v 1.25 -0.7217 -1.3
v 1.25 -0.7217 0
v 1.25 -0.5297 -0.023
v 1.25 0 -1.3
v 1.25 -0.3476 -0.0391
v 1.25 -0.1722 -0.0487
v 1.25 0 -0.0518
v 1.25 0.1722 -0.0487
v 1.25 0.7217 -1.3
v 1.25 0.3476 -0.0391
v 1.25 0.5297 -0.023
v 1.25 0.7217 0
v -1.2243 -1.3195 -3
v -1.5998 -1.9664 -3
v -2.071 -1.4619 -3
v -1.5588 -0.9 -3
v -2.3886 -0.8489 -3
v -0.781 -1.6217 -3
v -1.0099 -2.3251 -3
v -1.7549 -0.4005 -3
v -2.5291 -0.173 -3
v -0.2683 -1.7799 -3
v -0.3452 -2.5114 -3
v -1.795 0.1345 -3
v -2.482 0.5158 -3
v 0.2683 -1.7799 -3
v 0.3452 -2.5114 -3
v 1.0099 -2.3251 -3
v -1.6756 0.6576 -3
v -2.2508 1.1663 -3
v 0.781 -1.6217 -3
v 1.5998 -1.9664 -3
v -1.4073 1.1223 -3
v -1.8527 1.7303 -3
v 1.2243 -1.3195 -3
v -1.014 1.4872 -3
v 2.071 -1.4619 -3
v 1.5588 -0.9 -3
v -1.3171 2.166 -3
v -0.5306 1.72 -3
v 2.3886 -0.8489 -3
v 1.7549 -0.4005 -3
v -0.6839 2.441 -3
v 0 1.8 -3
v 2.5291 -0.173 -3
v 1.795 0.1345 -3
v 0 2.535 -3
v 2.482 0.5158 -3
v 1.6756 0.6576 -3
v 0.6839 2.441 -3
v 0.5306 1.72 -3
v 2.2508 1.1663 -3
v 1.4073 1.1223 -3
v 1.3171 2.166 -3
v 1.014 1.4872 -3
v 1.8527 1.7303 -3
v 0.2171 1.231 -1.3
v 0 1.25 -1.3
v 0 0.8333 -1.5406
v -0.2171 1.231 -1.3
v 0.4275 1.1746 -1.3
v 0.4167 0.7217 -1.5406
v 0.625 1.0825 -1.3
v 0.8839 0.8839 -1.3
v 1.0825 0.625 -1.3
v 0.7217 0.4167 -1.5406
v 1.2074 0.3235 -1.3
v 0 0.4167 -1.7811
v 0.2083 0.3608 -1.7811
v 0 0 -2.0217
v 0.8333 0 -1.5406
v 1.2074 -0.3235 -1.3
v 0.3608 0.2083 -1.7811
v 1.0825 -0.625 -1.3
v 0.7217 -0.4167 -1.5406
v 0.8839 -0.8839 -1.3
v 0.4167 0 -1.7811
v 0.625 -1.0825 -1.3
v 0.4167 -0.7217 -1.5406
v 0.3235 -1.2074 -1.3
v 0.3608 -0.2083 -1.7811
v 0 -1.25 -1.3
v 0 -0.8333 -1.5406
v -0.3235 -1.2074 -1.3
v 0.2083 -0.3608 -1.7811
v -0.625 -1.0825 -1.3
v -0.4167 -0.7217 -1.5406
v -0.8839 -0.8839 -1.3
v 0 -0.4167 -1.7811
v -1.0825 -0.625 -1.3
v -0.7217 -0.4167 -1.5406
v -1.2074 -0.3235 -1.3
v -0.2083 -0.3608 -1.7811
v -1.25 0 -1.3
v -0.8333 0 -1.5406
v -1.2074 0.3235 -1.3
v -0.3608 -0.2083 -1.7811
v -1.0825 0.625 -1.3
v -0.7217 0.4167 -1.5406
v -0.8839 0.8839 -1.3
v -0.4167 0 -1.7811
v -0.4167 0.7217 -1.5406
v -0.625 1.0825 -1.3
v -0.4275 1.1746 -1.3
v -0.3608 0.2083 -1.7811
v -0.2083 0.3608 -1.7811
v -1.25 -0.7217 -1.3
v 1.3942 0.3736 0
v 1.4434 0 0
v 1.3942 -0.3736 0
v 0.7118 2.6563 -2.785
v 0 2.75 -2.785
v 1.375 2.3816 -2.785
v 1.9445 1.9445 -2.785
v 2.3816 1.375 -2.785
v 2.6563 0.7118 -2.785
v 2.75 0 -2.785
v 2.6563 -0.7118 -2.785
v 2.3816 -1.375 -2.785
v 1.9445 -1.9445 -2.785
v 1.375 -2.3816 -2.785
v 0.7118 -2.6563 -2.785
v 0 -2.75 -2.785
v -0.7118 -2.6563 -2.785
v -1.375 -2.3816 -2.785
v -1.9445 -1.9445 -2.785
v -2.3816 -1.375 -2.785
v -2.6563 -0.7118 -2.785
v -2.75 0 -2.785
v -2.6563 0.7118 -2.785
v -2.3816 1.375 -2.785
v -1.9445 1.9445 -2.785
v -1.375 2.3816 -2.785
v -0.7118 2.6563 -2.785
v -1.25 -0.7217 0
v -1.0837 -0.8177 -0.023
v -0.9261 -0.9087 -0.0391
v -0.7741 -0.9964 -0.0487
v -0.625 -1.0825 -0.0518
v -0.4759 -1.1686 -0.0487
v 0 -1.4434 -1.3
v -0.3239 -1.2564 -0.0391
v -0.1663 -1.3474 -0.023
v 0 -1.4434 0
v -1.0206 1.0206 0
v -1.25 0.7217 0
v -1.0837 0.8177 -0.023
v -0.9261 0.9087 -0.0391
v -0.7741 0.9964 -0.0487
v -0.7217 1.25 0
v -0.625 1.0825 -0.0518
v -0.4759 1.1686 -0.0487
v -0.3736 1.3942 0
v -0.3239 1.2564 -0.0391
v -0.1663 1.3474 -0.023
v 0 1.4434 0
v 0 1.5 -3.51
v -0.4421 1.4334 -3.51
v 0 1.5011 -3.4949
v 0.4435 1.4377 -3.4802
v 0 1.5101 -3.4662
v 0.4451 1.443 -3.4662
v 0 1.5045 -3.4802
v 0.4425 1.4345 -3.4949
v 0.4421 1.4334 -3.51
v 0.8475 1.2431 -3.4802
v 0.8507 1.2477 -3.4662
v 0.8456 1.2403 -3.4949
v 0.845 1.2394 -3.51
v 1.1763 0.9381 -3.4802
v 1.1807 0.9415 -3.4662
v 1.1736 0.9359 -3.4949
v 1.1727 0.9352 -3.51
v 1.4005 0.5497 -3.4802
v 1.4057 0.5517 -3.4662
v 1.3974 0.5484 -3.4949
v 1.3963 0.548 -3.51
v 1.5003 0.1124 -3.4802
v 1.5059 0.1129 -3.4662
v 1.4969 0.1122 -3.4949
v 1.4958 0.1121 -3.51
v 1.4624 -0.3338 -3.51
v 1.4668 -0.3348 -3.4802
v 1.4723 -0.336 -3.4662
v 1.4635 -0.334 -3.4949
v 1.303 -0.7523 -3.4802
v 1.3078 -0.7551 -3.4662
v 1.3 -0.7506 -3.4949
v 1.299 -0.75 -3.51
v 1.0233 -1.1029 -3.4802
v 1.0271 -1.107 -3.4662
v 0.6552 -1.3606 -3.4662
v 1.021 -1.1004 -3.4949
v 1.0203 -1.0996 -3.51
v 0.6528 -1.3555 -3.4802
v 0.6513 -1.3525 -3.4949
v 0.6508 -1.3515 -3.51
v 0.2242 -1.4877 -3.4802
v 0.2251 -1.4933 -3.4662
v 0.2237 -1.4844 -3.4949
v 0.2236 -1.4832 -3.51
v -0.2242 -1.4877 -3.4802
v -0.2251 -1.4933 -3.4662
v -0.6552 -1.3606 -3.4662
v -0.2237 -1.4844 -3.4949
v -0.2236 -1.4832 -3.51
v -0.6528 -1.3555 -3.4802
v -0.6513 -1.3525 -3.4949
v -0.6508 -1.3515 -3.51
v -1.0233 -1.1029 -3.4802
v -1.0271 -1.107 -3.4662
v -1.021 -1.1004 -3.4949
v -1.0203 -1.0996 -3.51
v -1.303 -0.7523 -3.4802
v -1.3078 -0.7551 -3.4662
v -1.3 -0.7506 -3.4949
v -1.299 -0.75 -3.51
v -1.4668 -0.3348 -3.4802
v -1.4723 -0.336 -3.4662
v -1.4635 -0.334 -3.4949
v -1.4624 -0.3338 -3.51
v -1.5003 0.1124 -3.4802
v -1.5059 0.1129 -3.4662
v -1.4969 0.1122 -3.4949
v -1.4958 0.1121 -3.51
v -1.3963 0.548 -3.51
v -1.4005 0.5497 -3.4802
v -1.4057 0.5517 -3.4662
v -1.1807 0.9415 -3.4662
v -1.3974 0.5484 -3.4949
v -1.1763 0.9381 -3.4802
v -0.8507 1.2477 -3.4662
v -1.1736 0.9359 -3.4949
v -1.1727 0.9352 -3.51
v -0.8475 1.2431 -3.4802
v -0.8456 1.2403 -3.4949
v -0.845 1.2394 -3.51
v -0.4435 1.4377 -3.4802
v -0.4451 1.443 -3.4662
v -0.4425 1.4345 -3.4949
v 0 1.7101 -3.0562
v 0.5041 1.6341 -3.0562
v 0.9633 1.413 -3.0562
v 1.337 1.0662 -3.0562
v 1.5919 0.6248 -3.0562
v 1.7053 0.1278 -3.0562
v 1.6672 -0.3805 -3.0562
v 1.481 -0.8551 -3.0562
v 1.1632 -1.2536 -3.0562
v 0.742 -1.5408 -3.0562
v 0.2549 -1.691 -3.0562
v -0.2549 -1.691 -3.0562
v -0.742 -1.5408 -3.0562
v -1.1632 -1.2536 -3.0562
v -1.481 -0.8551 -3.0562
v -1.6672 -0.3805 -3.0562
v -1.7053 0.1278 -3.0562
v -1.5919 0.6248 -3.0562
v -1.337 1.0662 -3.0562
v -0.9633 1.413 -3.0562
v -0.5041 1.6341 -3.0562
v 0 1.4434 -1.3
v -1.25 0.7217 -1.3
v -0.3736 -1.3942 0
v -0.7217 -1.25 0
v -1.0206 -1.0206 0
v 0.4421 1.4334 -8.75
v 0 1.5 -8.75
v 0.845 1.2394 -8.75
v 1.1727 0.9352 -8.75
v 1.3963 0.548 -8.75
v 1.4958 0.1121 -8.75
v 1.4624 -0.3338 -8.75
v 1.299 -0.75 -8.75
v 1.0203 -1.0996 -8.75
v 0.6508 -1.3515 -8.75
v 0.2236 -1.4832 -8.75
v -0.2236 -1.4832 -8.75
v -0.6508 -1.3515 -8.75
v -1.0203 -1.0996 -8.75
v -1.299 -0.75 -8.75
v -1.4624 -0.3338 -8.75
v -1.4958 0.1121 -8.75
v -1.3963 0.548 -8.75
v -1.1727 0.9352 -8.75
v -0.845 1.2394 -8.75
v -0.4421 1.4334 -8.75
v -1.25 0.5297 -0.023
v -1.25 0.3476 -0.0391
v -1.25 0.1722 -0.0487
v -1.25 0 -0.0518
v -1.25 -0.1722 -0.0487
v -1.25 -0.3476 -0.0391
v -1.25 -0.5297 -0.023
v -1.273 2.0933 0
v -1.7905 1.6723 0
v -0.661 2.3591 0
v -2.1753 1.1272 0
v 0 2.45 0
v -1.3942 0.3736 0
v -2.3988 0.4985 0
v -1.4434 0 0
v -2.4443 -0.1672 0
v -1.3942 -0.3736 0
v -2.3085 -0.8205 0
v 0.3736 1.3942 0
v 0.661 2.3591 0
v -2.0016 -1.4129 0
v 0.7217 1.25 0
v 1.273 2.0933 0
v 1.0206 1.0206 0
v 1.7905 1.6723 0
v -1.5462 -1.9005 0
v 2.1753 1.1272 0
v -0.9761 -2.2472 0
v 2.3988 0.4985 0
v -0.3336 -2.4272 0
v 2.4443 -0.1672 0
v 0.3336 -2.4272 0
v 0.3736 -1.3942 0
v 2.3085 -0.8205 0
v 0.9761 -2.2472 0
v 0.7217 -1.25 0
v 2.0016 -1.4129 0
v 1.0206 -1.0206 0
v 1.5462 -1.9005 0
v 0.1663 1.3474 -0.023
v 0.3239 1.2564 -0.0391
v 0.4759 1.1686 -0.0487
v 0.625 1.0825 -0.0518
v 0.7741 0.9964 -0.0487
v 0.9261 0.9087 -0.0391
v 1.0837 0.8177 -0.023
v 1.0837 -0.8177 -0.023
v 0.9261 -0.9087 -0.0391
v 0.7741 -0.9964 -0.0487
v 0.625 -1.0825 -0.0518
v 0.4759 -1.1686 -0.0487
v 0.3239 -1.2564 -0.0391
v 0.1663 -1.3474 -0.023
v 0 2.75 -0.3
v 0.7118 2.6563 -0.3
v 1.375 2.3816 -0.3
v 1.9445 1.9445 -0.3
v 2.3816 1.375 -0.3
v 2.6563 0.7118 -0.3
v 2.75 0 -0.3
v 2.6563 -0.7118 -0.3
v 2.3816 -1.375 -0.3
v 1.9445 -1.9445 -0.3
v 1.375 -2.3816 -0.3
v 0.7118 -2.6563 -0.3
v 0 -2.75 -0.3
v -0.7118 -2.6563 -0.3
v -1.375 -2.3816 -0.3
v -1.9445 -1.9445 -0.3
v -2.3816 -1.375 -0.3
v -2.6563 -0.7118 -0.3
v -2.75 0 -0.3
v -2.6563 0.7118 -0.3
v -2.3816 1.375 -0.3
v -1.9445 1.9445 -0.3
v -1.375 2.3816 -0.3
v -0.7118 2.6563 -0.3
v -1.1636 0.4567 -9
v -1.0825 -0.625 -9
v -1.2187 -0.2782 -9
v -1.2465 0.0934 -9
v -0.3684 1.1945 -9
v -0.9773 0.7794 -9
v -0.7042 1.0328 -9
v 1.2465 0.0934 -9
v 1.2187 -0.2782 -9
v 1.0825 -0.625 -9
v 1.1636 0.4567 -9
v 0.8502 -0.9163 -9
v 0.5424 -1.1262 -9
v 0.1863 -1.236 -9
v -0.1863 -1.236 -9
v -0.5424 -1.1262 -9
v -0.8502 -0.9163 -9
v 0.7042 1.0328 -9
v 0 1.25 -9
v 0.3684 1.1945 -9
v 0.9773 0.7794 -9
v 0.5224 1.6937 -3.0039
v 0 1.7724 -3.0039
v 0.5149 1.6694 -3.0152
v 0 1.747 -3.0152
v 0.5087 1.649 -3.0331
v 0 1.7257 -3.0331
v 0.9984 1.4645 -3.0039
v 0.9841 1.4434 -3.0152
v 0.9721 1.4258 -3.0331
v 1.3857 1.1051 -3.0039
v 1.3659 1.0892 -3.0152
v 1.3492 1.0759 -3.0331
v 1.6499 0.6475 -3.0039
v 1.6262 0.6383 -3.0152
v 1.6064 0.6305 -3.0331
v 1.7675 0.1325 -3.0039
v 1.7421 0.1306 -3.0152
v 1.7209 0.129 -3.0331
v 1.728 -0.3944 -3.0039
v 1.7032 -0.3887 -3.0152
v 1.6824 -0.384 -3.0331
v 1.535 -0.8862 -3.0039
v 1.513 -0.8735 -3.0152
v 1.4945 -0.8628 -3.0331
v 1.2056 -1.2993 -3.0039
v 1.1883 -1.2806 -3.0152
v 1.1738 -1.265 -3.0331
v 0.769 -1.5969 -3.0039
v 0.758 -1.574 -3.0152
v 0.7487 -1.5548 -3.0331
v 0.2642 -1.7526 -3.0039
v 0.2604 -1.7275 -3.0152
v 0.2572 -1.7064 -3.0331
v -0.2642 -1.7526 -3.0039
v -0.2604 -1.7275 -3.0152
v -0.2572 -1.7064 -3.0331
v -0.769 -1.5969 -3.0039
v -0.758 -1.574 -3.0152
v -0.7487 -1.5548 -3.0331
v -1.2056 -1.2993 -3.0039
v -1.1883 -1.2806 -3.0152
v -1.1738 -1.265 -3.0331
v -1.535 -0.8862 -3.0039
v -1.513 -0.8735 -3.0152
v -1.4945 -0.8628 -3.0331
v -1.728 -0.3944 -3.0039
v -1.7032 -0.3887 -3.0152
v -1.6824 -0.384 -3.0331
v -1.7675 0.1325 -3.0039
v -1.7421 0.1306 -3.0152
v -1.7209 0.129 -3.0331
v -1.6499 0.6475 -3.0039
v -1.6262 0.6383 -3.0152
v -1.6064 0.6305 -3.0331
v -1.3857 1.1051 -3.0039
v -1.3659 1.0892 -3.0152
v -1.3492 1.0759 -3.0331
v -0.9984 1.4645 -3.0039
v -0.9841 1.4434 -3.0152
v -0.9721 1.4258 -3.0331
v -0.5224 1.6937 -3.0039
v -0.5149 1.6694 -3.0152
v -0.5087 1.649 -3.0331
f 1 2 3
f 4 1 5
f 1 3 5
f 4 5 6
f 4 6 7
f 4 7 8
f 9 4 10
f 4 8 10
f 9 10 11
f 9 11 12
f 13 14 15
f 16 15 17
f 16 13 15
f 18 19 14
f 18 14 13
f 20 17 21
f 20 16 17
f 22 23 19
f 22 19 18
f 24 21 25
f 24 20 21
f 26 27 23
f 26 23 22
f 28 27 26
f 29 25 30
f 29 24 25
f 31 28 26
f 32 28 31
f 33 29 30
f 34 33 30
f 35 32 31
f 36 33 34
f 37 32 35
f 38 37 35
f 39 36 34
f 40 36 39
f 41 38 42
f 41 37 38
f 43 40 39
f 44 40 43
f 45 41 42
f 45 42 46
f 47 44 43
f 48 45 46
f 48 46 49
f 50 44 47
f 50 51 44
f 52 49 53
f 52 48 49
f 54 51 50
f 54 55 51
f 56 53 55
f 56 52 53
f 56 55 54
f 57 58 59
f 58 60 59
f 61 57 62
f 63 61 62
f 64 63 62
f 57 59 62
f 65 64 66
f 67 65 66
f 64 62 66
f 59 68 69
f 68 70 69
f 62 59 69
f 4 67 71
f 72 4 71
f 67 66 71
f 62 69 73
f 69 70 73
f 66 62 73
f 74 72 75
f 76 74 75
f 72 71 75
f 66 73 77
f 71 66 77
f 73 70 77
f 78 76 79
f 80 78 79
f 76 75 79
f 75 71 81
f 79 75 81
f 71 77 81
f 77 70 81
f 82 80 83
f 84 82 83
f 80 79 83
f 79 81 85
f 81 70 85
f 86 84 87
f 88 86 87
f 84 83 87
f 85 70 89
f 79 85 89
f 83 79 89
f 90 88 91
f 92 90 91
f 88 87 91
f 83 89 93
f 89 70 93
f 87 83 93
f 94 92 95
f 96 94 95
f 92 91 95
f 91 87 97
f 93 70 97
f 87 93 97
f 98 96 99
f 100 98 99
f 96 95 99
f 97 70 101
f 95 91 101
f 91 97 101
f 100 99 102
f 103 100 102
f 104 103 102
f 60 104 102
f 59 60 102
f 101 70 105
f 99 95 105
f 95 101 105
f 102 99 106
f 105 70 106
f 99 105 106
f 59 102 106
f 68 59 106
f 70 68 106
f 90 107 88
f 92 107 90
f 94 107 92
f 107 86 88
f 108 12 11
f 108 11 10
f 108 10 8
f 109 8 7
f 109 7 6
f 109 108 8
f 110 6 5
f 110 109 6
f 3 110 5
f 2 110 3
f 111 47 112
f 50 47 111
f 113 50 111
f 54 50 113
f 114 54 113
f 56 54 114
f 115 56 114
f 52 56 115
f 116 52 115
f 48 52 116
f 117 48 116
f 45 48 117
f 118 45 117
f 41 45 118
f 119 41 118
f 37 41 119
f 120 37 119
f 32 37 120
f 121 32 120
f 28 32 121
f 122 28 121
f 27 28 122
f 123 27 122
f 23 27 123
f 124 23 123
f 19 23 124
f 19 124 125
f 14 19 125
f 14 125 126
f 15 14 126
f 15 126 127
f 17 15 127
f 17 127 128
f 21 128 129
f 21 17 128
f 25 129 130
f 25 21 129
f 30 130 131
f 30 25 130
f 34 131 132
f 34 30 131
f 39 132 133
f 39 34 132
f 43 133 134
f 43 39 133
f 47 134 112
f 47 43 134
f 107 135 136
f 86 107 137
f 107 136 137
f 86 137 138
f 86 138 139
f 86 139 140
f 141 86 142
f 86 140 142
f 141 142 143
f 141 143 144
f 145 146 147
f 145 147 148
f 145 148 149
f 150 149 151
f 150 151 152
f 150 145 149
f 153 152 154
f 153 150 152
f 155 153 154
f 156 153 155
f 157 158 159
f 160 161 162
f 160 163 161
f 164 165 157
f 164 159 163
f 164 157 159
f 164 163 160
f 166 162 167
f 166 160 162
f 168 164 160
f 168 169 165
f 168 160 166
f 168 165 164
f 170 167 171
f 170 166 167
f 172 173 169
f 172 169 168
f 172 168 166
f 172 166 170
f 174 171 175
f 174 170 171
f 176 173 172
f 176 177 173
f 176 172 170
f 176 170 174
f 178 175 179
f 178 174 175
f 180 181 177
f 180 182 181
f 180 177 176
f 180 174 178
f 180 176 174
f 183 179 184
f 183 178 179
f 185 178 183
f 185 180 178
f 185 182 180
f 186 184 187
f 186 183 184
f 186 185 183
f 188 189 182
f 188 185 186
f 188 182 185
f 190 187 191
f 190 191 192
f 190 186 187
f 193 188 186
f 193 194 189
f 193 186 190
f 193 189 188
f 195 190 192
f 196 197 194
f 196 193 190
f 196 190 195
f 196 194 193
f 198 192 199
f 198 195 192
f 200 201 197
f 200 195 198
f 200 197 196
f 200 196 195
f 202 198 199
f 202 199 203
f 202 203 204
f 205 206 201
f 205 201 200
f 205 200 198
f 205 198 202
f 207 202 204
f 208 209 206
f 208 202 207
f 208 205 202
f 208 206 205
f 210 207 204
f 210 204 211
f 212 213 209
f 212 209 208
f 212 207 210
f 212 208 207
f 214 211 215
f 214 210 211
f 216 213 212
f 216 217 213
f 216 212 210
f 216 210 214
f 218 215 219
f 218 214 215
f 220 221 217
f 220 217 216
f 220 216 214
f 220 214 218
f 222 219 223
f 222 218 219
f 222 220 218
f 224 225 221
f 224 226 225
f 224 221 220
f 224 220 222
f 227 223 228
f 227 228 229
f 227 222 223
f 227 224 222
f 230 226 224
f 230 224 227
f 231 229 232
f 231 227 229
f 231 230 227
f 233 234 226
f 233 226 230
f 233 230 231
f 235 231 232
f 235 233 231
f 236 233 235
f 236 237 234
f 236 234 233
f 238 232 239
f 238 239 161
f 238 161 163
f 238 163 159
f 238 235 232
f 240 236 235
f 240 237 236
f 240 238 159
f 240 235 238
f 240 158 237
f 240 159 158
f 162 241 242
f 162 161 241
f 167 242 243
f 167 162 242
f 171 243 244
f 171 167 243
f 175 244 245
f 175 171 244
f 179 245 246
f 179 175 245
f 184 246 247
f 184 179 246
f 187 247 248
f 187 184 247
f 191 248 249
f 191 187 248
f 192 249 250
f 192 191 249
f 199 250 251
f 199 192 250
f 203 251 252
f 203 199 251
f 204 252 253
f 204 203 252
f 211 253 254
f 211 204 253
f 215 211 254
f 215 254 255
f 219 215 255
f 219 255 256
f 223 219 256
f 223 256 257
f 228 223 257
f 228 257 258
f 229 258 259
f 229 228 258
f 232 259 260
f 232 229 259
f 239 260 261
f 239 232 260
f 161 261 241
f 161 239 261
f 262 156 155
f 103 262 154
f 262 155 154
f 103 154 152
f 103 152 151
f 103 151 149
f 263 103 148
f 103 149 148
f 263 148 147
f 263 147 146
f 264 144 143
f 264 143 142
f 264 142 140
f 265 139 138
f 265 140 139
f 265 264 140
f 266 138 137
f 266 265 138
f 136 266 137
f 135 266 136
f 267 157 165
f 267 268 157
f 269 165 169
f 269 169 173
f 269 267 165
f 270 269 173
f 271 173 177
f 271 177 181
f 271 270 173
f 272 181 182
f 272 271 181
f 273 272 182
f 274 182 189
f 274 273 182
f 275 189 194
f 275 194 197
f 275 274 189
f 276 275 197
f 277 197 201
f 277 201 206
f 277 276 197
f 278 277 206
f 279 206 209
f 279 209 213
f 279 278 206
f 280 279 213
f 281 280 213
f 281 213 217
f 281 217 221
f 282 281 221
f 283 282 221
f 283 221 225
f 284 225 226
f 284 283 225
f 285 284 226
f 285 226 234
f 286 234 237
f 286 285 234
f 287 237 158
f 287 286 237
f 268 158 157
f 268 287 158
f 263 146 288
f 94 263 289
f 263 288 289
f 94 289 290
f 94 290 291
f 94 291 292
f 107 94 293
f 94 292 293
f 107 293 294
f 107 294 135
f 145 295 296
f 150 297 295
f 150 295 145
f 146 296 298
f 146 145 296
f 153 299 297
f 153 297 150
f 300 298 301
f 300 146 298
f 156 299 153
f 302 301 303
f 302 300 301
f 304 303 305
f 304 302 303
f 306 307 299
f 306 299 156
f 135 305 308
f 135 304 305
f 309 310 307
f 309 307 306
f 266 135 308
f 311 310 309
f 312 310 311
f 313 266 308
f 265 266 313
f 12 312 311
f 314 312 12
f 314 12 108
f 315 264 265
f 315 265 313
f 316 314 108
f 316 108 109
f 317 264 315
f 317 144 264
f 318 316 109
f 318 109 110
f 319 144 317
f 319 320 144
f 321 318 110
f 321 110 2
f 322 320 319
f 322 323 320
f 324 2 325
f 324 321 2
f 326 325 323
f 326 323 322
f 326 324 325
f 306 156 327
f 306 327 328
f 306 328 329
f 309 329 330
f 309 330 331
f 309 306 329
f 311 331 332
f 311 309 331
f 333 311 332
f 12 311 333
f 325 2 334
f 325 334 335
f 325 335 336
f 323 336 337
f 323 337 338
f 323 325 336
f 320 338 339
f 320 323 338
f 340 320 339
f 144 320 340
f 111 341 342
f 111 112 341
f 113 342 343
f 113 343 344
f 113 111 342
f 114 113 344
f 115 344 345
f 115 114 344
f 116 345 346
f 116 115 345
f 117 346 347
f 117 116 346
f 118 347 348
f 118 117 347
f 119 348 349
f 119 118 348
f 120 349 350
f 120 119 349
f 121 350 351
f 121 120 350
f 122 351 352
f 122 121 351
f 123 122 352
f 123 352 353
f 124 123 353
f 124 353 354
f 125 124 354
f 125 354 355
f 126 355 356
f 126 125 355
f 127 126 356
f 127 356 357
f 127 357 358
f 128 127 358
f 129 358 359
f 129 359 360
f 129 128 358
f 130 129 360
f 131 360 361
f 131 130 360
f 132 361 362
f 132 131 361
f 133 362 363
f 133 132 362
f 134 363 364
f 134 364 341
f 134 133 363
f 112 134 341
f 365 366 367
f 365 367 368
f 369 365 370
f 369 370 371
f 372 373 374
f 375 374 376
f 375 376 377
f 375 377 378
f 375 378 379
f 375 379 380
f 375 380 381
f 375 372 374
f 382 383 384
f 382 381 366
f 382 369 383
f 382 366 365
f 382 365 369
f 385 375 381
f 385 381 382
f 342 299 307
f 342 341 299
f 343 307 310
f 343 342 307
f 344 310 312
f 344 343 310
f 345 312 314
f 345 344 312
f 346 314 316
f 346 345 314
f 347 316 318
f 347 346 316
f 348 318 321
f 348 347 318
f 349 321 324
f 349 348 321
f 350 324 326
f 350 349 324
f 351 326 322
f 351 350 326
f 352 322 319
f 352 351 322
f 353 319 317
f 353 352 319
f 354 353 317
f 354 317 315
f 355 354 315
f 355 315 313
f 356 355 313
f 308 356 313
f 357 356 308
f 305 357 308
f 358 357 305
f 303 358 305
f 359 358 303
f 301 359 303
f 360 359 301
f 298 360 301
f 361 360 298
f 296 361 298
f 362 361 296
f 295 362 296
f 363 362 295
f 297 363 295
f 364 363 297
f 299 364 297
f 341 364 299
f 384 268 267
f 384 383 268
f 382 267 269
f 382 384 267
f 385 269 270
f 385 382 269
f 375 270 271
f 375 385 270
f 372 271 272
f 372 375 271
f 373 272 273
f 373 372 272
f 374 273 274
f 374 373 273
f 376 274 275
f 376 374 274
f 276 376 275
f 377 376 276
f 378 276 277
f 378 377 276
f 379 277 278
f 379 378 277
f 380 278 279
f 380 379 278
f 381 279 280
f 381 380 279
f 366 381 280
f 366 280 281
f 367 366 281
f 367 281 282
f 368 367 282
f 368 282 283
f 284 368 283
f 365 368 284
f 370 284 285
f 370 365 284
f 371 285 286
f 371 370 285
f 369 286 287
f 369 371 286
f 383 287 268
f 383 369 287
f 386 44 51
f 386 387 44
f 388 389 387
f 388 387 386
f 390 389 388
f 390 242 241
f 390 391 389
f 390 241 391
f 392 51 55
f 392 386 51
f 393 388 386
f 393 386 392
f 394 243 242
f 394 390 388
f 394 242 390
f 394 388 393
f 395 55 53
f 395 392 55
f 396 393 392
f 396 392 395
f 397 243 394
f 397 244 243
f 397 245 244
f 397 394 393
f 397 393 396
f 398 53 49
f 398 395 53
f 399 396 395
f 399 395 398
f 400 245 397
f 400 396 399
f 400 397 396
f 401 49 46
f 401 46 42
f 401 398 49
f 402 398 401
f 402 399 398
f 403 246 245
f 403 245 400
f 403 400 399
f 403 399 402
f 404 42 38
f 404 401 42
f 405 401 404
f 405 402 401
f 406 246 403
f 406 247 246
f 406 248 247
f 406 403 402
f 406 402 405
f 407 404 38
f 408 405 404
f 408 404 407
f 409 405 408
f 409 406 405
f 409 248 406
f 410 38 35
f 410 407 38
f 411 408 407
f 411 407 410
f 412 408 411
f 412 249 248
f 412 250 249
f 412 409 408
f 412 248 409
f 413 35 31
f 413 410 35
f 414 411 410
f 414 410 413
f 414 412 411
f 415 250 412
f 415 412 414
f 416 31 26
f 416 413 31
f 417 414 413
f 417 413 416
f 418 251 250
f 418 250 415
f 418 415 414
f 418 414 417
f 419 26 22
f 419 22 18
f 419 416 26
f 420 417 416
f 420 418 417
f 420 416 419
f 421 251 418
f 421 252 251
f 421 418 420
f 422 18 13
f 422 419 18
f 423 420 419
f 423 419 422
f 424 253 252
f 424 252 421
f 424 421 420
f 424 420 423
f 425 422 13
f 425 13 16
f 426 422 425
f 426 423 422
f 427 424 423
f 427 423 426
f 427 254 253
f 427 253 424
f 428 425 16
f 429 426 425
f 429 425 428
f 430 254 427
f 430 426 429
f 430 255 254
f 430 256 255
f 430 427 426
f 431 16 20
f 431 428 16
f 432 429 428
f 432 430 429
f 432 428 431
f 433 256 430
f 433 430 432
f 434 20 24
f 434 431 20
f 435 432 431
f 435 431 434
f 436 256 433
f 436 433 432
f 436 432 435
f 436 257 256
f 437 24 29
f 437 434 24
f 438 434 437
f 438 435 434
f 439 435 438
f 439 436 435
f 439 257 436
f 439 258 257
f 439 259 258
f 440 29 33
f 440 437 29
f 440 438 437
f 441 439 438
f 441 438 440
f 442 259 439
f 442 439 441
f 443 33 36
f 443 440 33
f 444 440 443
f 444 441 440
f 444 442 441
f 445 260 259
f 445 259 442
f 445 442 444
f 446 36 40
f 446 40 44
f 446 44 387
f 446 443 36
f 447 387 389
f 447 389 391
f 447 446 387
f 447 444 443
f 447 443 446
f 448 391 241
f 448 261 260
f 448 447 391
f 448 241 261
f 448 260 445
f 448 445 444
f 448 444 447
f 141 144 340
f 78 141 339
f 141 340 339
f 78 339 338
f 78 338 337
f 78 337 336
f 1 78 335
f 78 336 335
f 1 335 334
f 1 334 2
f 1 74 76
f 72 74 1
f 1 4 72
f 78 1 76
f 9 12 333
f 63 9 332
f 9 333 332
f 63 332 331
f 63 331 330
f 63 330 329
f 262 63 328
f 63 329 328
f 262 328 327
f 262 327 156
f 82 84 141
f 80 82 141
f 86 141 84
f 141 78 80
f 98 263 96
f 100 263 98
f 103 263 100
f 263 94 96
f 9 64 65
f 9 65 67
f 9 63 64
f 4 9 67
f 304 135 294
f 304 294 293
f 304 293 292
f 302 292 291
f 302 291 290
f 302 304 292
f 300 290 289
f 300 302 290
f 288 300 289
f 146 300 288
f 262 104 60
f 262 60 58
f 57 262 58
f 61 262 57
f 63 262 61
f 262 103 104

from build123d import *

# Parameters (mm, degrees)
CUT_EXTRUDE1_DEPTH = 1.3


with BuildPart() as part:
    # Sketch1 → Revolve1 (revolve)
    with BuildSketch(Plane(origin=(0, 0, 0), x_dir=(0, 0, -1), z_dir=(1, 0, 0))):
        with BuildLine():
            Line((0, 0), (0, 2.45))
            Line((0, 2.45), (0.3, 2.75))
            Line((0.3, 2.75), (2.785, 2.75))
            Line((2.785, 2.75), (3, 2.535))
            Line((3, 2.535), (3, 1.8))
            ThreePointArc((3, 1.8), (3.015193643, 1.74701055), (3.056157637, 1.710123155))
            Line((3.056157637, 1.710123155), (3.466157637, 1.510123155))
            ThreePointArc((3.466157637, 1.510123155), (3.48750205, 1.50256365), (3.51, 1.5))
            Line((3.51, 1.5), (8.75, 1.5))
            Line((8.75, 1.5), (9, 1.25))
            Line((9, 1.25), (9, 0))
            Line((9, 0), (0, 0))
        make_face()
    revolve(axis=Axis((0, 0, 0), (0, 0, -1)))

    # Sketch2 → Cut-Extrude1 (cut)
    with BuildSketch(Plane.XY):
        Polygon((0, 1.443375673), (-1.25, 0.721687836), (-1.25, -0.721687836), (0, -1.443375673), (1.25, -0.721687836), (1.25, 0.721687836), align=None)
    extrude(amount=-CUT_EXTRUDE1_DEPTH, mode=Mode.SUBTRACT)

    # Sketch3 → Cut-Revolve2 (revolve, cut)
    with BuildSketch(Plane(origin=(0, 0, 0), x_dir=(0, 0, -1), z_dir=(1, 0, 0))):
        Polygon((1.3, 0), (1.3, 1.25), (2.021687836, 0), align=None)
    revolve(axis=Axis((0, 0, -1.3), (0, 0, -1)), mode=Mode.SUBTRACT)

    # Sketch4 → Cut-Revolve3 (revolve, cut)
    with BuildSketch(Plane(origin=(0, 0, 0), x_dir=(0, 0, -1), z_dir=(1, 0, 0))):
        Polygon((0, 1.443375673), (0, 1.25), (0.051814855, 1.25), align=None)
    revolve(axis=Axis((0, 0, 0), (0, 0, -1)), mode=Mode.SUBTRACT)


solid = part.part
